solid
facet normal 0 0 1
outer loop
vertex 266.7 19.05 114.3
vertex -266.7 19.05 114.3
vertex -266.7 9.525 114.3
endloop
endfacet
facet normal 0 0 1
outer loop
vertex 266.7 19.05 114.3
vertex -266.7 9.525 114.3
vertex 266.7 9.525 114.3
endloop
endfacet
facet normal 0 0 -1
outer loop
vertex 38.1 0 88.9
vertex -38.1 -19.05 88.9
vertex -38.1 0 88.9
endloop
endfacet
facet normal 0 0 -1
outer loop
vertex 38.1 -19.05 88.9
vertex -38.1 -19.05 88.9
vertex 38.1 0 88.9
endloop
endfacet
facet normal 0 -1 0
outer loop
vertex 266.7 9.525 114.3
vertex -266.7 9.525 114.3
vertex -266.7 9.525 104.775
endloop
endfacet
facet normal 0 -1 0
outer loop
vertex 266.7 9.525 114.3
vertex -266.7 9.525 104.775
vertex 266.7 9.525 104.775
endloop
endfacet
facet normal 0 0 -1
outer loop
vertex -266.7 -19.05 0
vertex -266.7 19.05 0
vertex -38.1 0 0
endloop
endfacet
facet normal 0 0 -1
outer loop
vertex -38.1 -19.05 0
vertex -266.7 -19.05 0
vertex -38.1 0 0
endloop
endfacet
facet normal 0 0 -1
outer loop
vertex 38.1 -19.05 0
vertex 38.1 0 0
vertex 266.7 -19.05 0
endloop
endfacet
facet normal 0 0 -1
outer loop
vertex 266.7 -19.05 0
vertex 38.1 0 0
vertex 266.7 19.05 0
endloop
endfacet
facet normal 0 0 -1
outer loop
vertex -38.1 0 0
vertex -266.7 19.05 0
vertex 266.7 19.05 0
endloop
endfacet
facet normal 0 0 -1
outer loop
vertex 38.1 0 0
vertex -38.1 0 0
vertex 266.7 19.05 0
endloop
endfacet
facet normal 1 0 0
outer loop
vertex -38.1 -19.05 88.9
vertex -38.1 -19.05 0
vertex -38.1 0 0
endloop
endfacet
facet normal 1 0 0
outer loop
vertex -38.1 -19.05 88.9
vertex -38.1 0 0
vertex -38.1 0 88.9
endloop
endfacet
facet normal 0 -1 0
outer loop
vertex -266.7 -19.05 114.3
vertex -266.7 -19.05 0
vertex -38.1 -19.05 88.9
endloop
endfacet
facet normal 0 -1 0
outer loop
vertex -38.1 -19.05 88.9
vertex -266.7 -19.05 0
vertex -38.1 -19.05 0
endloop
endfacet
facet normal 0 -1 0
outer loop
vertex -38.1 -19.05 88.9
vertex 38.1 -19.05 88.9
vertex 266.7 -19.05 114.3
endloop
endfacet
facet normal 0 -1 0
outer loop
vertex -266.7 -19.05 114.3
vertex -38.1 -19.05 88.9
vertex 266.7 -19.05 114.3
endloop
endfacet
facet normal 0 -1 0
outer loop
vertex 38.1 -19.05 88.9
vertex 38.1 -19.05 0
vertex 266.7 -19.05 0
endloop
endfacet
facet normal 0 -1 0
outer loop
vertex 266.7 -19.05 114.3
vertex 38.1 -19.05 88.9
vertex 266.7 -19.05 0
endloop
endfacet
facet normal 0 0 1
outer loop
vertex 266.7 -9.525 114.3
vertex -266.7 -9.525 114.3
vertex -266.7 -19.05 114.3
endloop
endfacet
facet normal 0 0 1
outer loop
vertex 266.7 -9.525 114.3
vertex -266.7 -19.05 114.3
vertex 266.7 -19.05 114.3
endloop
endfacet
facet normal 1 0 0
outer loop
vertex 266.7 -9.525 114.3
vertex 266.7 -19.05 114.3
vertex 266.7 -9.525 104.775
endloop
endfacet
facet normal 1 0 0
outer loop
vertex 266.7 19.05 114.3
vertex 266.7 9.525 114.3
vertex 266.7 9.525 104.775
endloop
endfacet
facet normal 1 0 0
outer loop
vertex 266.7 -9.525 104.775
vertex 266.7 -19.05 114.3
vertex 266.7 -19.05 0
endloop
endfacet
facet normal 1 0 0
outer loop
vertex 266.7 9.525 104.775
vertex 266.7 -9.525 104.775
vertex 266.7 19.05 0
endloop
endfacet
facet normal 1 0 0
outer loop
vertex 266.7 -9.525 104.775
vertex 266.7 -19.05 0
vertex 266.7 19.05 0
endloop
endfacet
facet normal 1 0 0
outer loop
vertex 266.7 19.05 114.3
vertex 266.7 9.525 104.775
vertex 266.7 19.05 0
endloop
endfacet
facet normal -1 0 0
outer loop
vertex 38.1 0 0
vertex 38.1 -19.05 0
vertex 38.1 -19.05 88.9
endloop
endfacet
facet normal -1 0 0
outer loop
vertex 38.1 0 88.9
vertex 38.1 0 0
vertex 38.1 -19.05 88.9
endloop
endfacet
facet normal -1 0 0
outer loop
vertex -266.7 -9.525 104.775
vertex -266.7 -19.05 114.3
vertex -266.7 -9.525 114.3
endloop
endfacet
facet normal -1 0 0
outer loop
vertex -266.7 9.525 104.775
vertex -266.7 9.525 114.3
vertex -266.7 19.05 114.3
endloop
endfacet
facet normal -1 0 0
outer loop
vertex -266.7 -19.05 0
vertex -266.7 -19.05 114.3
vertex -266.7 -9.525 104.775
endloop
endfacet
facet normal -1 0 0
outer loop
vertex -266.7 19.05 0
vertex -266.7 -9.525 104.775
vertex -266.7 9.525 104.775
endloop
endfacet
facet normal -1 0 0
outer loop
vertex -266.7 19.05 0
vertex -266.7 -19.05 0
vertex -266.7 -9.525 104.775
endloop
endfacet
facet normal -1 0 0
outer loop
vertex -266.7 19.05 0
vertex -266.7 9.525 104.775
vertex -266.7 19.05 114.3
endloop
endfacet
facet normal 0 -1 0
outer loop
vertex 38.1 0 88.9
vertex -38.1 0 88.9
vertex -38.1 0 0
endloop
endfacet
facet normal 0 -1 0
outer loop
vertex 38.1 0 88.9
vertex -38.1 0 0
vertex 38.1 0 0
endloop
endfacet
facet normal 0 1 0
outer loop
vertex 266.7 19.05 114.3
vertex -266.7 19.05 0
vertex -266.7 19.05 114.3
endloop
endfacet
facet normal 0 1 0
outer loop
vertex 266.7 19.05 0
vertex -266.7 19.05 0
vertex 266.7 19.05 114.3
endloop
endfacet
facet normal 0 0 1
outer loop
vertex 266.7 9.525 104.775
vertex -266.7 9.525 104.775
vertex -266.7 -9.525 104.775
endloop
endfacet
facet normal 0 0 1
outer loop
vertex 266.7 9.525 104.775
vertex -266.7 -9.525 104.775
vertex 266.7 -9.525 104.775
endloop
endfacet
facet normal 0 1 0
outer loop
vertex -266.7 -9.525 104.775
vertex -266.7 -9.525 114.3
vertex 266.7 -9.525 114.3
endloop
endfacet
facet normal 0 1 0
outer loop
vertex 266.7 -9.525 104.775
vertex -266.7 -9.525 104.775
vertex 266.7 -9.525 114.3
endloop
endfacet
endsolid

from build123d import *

# Parameters (mm, degrees)
SKETCH_W        = 533.4
SKETCH_H        = 38.1
PAD_DEPTH       = 114.3
SKETCH001_W     = 762
SKETCH001_H     = 19.05
POCKET_DEPTH    = 9.525
SKETCH003_W     = 76.2
SKETCH003_H     = 88.9
POCKET002_DEPTH = 19.05


with BuildPart() as part:
    # Sketch → Pad (new body)
    with BuildSketch(Plane.XY):
        Rectangle(SKETCH_W, SKETCH_H)
    extrude(amount=PAD_DEPTH)

    # Sketch001 (on Face6 of Pad) → Pocket (cut)
    with BuildSketch(Plane.XY.offset(114.3)):
        Rectangle(SKETCH001_W, SKETCH001_H)
    extrude(amount=-POCKET_DEPTH, mode=Mode.SUBTRACT)

    # Sketch003 → Pocket002 (cut)
    with BuildSketch(Plane.XZ.offset(19.05)):
        with Locations((0, 44.45)):
            Rectangle(SKETCH003_W, SKETCH003_H)
    extrude(amount=-POCKET002_DEPTH, mode=Mode.SUBTRACT)


solid = part.part
